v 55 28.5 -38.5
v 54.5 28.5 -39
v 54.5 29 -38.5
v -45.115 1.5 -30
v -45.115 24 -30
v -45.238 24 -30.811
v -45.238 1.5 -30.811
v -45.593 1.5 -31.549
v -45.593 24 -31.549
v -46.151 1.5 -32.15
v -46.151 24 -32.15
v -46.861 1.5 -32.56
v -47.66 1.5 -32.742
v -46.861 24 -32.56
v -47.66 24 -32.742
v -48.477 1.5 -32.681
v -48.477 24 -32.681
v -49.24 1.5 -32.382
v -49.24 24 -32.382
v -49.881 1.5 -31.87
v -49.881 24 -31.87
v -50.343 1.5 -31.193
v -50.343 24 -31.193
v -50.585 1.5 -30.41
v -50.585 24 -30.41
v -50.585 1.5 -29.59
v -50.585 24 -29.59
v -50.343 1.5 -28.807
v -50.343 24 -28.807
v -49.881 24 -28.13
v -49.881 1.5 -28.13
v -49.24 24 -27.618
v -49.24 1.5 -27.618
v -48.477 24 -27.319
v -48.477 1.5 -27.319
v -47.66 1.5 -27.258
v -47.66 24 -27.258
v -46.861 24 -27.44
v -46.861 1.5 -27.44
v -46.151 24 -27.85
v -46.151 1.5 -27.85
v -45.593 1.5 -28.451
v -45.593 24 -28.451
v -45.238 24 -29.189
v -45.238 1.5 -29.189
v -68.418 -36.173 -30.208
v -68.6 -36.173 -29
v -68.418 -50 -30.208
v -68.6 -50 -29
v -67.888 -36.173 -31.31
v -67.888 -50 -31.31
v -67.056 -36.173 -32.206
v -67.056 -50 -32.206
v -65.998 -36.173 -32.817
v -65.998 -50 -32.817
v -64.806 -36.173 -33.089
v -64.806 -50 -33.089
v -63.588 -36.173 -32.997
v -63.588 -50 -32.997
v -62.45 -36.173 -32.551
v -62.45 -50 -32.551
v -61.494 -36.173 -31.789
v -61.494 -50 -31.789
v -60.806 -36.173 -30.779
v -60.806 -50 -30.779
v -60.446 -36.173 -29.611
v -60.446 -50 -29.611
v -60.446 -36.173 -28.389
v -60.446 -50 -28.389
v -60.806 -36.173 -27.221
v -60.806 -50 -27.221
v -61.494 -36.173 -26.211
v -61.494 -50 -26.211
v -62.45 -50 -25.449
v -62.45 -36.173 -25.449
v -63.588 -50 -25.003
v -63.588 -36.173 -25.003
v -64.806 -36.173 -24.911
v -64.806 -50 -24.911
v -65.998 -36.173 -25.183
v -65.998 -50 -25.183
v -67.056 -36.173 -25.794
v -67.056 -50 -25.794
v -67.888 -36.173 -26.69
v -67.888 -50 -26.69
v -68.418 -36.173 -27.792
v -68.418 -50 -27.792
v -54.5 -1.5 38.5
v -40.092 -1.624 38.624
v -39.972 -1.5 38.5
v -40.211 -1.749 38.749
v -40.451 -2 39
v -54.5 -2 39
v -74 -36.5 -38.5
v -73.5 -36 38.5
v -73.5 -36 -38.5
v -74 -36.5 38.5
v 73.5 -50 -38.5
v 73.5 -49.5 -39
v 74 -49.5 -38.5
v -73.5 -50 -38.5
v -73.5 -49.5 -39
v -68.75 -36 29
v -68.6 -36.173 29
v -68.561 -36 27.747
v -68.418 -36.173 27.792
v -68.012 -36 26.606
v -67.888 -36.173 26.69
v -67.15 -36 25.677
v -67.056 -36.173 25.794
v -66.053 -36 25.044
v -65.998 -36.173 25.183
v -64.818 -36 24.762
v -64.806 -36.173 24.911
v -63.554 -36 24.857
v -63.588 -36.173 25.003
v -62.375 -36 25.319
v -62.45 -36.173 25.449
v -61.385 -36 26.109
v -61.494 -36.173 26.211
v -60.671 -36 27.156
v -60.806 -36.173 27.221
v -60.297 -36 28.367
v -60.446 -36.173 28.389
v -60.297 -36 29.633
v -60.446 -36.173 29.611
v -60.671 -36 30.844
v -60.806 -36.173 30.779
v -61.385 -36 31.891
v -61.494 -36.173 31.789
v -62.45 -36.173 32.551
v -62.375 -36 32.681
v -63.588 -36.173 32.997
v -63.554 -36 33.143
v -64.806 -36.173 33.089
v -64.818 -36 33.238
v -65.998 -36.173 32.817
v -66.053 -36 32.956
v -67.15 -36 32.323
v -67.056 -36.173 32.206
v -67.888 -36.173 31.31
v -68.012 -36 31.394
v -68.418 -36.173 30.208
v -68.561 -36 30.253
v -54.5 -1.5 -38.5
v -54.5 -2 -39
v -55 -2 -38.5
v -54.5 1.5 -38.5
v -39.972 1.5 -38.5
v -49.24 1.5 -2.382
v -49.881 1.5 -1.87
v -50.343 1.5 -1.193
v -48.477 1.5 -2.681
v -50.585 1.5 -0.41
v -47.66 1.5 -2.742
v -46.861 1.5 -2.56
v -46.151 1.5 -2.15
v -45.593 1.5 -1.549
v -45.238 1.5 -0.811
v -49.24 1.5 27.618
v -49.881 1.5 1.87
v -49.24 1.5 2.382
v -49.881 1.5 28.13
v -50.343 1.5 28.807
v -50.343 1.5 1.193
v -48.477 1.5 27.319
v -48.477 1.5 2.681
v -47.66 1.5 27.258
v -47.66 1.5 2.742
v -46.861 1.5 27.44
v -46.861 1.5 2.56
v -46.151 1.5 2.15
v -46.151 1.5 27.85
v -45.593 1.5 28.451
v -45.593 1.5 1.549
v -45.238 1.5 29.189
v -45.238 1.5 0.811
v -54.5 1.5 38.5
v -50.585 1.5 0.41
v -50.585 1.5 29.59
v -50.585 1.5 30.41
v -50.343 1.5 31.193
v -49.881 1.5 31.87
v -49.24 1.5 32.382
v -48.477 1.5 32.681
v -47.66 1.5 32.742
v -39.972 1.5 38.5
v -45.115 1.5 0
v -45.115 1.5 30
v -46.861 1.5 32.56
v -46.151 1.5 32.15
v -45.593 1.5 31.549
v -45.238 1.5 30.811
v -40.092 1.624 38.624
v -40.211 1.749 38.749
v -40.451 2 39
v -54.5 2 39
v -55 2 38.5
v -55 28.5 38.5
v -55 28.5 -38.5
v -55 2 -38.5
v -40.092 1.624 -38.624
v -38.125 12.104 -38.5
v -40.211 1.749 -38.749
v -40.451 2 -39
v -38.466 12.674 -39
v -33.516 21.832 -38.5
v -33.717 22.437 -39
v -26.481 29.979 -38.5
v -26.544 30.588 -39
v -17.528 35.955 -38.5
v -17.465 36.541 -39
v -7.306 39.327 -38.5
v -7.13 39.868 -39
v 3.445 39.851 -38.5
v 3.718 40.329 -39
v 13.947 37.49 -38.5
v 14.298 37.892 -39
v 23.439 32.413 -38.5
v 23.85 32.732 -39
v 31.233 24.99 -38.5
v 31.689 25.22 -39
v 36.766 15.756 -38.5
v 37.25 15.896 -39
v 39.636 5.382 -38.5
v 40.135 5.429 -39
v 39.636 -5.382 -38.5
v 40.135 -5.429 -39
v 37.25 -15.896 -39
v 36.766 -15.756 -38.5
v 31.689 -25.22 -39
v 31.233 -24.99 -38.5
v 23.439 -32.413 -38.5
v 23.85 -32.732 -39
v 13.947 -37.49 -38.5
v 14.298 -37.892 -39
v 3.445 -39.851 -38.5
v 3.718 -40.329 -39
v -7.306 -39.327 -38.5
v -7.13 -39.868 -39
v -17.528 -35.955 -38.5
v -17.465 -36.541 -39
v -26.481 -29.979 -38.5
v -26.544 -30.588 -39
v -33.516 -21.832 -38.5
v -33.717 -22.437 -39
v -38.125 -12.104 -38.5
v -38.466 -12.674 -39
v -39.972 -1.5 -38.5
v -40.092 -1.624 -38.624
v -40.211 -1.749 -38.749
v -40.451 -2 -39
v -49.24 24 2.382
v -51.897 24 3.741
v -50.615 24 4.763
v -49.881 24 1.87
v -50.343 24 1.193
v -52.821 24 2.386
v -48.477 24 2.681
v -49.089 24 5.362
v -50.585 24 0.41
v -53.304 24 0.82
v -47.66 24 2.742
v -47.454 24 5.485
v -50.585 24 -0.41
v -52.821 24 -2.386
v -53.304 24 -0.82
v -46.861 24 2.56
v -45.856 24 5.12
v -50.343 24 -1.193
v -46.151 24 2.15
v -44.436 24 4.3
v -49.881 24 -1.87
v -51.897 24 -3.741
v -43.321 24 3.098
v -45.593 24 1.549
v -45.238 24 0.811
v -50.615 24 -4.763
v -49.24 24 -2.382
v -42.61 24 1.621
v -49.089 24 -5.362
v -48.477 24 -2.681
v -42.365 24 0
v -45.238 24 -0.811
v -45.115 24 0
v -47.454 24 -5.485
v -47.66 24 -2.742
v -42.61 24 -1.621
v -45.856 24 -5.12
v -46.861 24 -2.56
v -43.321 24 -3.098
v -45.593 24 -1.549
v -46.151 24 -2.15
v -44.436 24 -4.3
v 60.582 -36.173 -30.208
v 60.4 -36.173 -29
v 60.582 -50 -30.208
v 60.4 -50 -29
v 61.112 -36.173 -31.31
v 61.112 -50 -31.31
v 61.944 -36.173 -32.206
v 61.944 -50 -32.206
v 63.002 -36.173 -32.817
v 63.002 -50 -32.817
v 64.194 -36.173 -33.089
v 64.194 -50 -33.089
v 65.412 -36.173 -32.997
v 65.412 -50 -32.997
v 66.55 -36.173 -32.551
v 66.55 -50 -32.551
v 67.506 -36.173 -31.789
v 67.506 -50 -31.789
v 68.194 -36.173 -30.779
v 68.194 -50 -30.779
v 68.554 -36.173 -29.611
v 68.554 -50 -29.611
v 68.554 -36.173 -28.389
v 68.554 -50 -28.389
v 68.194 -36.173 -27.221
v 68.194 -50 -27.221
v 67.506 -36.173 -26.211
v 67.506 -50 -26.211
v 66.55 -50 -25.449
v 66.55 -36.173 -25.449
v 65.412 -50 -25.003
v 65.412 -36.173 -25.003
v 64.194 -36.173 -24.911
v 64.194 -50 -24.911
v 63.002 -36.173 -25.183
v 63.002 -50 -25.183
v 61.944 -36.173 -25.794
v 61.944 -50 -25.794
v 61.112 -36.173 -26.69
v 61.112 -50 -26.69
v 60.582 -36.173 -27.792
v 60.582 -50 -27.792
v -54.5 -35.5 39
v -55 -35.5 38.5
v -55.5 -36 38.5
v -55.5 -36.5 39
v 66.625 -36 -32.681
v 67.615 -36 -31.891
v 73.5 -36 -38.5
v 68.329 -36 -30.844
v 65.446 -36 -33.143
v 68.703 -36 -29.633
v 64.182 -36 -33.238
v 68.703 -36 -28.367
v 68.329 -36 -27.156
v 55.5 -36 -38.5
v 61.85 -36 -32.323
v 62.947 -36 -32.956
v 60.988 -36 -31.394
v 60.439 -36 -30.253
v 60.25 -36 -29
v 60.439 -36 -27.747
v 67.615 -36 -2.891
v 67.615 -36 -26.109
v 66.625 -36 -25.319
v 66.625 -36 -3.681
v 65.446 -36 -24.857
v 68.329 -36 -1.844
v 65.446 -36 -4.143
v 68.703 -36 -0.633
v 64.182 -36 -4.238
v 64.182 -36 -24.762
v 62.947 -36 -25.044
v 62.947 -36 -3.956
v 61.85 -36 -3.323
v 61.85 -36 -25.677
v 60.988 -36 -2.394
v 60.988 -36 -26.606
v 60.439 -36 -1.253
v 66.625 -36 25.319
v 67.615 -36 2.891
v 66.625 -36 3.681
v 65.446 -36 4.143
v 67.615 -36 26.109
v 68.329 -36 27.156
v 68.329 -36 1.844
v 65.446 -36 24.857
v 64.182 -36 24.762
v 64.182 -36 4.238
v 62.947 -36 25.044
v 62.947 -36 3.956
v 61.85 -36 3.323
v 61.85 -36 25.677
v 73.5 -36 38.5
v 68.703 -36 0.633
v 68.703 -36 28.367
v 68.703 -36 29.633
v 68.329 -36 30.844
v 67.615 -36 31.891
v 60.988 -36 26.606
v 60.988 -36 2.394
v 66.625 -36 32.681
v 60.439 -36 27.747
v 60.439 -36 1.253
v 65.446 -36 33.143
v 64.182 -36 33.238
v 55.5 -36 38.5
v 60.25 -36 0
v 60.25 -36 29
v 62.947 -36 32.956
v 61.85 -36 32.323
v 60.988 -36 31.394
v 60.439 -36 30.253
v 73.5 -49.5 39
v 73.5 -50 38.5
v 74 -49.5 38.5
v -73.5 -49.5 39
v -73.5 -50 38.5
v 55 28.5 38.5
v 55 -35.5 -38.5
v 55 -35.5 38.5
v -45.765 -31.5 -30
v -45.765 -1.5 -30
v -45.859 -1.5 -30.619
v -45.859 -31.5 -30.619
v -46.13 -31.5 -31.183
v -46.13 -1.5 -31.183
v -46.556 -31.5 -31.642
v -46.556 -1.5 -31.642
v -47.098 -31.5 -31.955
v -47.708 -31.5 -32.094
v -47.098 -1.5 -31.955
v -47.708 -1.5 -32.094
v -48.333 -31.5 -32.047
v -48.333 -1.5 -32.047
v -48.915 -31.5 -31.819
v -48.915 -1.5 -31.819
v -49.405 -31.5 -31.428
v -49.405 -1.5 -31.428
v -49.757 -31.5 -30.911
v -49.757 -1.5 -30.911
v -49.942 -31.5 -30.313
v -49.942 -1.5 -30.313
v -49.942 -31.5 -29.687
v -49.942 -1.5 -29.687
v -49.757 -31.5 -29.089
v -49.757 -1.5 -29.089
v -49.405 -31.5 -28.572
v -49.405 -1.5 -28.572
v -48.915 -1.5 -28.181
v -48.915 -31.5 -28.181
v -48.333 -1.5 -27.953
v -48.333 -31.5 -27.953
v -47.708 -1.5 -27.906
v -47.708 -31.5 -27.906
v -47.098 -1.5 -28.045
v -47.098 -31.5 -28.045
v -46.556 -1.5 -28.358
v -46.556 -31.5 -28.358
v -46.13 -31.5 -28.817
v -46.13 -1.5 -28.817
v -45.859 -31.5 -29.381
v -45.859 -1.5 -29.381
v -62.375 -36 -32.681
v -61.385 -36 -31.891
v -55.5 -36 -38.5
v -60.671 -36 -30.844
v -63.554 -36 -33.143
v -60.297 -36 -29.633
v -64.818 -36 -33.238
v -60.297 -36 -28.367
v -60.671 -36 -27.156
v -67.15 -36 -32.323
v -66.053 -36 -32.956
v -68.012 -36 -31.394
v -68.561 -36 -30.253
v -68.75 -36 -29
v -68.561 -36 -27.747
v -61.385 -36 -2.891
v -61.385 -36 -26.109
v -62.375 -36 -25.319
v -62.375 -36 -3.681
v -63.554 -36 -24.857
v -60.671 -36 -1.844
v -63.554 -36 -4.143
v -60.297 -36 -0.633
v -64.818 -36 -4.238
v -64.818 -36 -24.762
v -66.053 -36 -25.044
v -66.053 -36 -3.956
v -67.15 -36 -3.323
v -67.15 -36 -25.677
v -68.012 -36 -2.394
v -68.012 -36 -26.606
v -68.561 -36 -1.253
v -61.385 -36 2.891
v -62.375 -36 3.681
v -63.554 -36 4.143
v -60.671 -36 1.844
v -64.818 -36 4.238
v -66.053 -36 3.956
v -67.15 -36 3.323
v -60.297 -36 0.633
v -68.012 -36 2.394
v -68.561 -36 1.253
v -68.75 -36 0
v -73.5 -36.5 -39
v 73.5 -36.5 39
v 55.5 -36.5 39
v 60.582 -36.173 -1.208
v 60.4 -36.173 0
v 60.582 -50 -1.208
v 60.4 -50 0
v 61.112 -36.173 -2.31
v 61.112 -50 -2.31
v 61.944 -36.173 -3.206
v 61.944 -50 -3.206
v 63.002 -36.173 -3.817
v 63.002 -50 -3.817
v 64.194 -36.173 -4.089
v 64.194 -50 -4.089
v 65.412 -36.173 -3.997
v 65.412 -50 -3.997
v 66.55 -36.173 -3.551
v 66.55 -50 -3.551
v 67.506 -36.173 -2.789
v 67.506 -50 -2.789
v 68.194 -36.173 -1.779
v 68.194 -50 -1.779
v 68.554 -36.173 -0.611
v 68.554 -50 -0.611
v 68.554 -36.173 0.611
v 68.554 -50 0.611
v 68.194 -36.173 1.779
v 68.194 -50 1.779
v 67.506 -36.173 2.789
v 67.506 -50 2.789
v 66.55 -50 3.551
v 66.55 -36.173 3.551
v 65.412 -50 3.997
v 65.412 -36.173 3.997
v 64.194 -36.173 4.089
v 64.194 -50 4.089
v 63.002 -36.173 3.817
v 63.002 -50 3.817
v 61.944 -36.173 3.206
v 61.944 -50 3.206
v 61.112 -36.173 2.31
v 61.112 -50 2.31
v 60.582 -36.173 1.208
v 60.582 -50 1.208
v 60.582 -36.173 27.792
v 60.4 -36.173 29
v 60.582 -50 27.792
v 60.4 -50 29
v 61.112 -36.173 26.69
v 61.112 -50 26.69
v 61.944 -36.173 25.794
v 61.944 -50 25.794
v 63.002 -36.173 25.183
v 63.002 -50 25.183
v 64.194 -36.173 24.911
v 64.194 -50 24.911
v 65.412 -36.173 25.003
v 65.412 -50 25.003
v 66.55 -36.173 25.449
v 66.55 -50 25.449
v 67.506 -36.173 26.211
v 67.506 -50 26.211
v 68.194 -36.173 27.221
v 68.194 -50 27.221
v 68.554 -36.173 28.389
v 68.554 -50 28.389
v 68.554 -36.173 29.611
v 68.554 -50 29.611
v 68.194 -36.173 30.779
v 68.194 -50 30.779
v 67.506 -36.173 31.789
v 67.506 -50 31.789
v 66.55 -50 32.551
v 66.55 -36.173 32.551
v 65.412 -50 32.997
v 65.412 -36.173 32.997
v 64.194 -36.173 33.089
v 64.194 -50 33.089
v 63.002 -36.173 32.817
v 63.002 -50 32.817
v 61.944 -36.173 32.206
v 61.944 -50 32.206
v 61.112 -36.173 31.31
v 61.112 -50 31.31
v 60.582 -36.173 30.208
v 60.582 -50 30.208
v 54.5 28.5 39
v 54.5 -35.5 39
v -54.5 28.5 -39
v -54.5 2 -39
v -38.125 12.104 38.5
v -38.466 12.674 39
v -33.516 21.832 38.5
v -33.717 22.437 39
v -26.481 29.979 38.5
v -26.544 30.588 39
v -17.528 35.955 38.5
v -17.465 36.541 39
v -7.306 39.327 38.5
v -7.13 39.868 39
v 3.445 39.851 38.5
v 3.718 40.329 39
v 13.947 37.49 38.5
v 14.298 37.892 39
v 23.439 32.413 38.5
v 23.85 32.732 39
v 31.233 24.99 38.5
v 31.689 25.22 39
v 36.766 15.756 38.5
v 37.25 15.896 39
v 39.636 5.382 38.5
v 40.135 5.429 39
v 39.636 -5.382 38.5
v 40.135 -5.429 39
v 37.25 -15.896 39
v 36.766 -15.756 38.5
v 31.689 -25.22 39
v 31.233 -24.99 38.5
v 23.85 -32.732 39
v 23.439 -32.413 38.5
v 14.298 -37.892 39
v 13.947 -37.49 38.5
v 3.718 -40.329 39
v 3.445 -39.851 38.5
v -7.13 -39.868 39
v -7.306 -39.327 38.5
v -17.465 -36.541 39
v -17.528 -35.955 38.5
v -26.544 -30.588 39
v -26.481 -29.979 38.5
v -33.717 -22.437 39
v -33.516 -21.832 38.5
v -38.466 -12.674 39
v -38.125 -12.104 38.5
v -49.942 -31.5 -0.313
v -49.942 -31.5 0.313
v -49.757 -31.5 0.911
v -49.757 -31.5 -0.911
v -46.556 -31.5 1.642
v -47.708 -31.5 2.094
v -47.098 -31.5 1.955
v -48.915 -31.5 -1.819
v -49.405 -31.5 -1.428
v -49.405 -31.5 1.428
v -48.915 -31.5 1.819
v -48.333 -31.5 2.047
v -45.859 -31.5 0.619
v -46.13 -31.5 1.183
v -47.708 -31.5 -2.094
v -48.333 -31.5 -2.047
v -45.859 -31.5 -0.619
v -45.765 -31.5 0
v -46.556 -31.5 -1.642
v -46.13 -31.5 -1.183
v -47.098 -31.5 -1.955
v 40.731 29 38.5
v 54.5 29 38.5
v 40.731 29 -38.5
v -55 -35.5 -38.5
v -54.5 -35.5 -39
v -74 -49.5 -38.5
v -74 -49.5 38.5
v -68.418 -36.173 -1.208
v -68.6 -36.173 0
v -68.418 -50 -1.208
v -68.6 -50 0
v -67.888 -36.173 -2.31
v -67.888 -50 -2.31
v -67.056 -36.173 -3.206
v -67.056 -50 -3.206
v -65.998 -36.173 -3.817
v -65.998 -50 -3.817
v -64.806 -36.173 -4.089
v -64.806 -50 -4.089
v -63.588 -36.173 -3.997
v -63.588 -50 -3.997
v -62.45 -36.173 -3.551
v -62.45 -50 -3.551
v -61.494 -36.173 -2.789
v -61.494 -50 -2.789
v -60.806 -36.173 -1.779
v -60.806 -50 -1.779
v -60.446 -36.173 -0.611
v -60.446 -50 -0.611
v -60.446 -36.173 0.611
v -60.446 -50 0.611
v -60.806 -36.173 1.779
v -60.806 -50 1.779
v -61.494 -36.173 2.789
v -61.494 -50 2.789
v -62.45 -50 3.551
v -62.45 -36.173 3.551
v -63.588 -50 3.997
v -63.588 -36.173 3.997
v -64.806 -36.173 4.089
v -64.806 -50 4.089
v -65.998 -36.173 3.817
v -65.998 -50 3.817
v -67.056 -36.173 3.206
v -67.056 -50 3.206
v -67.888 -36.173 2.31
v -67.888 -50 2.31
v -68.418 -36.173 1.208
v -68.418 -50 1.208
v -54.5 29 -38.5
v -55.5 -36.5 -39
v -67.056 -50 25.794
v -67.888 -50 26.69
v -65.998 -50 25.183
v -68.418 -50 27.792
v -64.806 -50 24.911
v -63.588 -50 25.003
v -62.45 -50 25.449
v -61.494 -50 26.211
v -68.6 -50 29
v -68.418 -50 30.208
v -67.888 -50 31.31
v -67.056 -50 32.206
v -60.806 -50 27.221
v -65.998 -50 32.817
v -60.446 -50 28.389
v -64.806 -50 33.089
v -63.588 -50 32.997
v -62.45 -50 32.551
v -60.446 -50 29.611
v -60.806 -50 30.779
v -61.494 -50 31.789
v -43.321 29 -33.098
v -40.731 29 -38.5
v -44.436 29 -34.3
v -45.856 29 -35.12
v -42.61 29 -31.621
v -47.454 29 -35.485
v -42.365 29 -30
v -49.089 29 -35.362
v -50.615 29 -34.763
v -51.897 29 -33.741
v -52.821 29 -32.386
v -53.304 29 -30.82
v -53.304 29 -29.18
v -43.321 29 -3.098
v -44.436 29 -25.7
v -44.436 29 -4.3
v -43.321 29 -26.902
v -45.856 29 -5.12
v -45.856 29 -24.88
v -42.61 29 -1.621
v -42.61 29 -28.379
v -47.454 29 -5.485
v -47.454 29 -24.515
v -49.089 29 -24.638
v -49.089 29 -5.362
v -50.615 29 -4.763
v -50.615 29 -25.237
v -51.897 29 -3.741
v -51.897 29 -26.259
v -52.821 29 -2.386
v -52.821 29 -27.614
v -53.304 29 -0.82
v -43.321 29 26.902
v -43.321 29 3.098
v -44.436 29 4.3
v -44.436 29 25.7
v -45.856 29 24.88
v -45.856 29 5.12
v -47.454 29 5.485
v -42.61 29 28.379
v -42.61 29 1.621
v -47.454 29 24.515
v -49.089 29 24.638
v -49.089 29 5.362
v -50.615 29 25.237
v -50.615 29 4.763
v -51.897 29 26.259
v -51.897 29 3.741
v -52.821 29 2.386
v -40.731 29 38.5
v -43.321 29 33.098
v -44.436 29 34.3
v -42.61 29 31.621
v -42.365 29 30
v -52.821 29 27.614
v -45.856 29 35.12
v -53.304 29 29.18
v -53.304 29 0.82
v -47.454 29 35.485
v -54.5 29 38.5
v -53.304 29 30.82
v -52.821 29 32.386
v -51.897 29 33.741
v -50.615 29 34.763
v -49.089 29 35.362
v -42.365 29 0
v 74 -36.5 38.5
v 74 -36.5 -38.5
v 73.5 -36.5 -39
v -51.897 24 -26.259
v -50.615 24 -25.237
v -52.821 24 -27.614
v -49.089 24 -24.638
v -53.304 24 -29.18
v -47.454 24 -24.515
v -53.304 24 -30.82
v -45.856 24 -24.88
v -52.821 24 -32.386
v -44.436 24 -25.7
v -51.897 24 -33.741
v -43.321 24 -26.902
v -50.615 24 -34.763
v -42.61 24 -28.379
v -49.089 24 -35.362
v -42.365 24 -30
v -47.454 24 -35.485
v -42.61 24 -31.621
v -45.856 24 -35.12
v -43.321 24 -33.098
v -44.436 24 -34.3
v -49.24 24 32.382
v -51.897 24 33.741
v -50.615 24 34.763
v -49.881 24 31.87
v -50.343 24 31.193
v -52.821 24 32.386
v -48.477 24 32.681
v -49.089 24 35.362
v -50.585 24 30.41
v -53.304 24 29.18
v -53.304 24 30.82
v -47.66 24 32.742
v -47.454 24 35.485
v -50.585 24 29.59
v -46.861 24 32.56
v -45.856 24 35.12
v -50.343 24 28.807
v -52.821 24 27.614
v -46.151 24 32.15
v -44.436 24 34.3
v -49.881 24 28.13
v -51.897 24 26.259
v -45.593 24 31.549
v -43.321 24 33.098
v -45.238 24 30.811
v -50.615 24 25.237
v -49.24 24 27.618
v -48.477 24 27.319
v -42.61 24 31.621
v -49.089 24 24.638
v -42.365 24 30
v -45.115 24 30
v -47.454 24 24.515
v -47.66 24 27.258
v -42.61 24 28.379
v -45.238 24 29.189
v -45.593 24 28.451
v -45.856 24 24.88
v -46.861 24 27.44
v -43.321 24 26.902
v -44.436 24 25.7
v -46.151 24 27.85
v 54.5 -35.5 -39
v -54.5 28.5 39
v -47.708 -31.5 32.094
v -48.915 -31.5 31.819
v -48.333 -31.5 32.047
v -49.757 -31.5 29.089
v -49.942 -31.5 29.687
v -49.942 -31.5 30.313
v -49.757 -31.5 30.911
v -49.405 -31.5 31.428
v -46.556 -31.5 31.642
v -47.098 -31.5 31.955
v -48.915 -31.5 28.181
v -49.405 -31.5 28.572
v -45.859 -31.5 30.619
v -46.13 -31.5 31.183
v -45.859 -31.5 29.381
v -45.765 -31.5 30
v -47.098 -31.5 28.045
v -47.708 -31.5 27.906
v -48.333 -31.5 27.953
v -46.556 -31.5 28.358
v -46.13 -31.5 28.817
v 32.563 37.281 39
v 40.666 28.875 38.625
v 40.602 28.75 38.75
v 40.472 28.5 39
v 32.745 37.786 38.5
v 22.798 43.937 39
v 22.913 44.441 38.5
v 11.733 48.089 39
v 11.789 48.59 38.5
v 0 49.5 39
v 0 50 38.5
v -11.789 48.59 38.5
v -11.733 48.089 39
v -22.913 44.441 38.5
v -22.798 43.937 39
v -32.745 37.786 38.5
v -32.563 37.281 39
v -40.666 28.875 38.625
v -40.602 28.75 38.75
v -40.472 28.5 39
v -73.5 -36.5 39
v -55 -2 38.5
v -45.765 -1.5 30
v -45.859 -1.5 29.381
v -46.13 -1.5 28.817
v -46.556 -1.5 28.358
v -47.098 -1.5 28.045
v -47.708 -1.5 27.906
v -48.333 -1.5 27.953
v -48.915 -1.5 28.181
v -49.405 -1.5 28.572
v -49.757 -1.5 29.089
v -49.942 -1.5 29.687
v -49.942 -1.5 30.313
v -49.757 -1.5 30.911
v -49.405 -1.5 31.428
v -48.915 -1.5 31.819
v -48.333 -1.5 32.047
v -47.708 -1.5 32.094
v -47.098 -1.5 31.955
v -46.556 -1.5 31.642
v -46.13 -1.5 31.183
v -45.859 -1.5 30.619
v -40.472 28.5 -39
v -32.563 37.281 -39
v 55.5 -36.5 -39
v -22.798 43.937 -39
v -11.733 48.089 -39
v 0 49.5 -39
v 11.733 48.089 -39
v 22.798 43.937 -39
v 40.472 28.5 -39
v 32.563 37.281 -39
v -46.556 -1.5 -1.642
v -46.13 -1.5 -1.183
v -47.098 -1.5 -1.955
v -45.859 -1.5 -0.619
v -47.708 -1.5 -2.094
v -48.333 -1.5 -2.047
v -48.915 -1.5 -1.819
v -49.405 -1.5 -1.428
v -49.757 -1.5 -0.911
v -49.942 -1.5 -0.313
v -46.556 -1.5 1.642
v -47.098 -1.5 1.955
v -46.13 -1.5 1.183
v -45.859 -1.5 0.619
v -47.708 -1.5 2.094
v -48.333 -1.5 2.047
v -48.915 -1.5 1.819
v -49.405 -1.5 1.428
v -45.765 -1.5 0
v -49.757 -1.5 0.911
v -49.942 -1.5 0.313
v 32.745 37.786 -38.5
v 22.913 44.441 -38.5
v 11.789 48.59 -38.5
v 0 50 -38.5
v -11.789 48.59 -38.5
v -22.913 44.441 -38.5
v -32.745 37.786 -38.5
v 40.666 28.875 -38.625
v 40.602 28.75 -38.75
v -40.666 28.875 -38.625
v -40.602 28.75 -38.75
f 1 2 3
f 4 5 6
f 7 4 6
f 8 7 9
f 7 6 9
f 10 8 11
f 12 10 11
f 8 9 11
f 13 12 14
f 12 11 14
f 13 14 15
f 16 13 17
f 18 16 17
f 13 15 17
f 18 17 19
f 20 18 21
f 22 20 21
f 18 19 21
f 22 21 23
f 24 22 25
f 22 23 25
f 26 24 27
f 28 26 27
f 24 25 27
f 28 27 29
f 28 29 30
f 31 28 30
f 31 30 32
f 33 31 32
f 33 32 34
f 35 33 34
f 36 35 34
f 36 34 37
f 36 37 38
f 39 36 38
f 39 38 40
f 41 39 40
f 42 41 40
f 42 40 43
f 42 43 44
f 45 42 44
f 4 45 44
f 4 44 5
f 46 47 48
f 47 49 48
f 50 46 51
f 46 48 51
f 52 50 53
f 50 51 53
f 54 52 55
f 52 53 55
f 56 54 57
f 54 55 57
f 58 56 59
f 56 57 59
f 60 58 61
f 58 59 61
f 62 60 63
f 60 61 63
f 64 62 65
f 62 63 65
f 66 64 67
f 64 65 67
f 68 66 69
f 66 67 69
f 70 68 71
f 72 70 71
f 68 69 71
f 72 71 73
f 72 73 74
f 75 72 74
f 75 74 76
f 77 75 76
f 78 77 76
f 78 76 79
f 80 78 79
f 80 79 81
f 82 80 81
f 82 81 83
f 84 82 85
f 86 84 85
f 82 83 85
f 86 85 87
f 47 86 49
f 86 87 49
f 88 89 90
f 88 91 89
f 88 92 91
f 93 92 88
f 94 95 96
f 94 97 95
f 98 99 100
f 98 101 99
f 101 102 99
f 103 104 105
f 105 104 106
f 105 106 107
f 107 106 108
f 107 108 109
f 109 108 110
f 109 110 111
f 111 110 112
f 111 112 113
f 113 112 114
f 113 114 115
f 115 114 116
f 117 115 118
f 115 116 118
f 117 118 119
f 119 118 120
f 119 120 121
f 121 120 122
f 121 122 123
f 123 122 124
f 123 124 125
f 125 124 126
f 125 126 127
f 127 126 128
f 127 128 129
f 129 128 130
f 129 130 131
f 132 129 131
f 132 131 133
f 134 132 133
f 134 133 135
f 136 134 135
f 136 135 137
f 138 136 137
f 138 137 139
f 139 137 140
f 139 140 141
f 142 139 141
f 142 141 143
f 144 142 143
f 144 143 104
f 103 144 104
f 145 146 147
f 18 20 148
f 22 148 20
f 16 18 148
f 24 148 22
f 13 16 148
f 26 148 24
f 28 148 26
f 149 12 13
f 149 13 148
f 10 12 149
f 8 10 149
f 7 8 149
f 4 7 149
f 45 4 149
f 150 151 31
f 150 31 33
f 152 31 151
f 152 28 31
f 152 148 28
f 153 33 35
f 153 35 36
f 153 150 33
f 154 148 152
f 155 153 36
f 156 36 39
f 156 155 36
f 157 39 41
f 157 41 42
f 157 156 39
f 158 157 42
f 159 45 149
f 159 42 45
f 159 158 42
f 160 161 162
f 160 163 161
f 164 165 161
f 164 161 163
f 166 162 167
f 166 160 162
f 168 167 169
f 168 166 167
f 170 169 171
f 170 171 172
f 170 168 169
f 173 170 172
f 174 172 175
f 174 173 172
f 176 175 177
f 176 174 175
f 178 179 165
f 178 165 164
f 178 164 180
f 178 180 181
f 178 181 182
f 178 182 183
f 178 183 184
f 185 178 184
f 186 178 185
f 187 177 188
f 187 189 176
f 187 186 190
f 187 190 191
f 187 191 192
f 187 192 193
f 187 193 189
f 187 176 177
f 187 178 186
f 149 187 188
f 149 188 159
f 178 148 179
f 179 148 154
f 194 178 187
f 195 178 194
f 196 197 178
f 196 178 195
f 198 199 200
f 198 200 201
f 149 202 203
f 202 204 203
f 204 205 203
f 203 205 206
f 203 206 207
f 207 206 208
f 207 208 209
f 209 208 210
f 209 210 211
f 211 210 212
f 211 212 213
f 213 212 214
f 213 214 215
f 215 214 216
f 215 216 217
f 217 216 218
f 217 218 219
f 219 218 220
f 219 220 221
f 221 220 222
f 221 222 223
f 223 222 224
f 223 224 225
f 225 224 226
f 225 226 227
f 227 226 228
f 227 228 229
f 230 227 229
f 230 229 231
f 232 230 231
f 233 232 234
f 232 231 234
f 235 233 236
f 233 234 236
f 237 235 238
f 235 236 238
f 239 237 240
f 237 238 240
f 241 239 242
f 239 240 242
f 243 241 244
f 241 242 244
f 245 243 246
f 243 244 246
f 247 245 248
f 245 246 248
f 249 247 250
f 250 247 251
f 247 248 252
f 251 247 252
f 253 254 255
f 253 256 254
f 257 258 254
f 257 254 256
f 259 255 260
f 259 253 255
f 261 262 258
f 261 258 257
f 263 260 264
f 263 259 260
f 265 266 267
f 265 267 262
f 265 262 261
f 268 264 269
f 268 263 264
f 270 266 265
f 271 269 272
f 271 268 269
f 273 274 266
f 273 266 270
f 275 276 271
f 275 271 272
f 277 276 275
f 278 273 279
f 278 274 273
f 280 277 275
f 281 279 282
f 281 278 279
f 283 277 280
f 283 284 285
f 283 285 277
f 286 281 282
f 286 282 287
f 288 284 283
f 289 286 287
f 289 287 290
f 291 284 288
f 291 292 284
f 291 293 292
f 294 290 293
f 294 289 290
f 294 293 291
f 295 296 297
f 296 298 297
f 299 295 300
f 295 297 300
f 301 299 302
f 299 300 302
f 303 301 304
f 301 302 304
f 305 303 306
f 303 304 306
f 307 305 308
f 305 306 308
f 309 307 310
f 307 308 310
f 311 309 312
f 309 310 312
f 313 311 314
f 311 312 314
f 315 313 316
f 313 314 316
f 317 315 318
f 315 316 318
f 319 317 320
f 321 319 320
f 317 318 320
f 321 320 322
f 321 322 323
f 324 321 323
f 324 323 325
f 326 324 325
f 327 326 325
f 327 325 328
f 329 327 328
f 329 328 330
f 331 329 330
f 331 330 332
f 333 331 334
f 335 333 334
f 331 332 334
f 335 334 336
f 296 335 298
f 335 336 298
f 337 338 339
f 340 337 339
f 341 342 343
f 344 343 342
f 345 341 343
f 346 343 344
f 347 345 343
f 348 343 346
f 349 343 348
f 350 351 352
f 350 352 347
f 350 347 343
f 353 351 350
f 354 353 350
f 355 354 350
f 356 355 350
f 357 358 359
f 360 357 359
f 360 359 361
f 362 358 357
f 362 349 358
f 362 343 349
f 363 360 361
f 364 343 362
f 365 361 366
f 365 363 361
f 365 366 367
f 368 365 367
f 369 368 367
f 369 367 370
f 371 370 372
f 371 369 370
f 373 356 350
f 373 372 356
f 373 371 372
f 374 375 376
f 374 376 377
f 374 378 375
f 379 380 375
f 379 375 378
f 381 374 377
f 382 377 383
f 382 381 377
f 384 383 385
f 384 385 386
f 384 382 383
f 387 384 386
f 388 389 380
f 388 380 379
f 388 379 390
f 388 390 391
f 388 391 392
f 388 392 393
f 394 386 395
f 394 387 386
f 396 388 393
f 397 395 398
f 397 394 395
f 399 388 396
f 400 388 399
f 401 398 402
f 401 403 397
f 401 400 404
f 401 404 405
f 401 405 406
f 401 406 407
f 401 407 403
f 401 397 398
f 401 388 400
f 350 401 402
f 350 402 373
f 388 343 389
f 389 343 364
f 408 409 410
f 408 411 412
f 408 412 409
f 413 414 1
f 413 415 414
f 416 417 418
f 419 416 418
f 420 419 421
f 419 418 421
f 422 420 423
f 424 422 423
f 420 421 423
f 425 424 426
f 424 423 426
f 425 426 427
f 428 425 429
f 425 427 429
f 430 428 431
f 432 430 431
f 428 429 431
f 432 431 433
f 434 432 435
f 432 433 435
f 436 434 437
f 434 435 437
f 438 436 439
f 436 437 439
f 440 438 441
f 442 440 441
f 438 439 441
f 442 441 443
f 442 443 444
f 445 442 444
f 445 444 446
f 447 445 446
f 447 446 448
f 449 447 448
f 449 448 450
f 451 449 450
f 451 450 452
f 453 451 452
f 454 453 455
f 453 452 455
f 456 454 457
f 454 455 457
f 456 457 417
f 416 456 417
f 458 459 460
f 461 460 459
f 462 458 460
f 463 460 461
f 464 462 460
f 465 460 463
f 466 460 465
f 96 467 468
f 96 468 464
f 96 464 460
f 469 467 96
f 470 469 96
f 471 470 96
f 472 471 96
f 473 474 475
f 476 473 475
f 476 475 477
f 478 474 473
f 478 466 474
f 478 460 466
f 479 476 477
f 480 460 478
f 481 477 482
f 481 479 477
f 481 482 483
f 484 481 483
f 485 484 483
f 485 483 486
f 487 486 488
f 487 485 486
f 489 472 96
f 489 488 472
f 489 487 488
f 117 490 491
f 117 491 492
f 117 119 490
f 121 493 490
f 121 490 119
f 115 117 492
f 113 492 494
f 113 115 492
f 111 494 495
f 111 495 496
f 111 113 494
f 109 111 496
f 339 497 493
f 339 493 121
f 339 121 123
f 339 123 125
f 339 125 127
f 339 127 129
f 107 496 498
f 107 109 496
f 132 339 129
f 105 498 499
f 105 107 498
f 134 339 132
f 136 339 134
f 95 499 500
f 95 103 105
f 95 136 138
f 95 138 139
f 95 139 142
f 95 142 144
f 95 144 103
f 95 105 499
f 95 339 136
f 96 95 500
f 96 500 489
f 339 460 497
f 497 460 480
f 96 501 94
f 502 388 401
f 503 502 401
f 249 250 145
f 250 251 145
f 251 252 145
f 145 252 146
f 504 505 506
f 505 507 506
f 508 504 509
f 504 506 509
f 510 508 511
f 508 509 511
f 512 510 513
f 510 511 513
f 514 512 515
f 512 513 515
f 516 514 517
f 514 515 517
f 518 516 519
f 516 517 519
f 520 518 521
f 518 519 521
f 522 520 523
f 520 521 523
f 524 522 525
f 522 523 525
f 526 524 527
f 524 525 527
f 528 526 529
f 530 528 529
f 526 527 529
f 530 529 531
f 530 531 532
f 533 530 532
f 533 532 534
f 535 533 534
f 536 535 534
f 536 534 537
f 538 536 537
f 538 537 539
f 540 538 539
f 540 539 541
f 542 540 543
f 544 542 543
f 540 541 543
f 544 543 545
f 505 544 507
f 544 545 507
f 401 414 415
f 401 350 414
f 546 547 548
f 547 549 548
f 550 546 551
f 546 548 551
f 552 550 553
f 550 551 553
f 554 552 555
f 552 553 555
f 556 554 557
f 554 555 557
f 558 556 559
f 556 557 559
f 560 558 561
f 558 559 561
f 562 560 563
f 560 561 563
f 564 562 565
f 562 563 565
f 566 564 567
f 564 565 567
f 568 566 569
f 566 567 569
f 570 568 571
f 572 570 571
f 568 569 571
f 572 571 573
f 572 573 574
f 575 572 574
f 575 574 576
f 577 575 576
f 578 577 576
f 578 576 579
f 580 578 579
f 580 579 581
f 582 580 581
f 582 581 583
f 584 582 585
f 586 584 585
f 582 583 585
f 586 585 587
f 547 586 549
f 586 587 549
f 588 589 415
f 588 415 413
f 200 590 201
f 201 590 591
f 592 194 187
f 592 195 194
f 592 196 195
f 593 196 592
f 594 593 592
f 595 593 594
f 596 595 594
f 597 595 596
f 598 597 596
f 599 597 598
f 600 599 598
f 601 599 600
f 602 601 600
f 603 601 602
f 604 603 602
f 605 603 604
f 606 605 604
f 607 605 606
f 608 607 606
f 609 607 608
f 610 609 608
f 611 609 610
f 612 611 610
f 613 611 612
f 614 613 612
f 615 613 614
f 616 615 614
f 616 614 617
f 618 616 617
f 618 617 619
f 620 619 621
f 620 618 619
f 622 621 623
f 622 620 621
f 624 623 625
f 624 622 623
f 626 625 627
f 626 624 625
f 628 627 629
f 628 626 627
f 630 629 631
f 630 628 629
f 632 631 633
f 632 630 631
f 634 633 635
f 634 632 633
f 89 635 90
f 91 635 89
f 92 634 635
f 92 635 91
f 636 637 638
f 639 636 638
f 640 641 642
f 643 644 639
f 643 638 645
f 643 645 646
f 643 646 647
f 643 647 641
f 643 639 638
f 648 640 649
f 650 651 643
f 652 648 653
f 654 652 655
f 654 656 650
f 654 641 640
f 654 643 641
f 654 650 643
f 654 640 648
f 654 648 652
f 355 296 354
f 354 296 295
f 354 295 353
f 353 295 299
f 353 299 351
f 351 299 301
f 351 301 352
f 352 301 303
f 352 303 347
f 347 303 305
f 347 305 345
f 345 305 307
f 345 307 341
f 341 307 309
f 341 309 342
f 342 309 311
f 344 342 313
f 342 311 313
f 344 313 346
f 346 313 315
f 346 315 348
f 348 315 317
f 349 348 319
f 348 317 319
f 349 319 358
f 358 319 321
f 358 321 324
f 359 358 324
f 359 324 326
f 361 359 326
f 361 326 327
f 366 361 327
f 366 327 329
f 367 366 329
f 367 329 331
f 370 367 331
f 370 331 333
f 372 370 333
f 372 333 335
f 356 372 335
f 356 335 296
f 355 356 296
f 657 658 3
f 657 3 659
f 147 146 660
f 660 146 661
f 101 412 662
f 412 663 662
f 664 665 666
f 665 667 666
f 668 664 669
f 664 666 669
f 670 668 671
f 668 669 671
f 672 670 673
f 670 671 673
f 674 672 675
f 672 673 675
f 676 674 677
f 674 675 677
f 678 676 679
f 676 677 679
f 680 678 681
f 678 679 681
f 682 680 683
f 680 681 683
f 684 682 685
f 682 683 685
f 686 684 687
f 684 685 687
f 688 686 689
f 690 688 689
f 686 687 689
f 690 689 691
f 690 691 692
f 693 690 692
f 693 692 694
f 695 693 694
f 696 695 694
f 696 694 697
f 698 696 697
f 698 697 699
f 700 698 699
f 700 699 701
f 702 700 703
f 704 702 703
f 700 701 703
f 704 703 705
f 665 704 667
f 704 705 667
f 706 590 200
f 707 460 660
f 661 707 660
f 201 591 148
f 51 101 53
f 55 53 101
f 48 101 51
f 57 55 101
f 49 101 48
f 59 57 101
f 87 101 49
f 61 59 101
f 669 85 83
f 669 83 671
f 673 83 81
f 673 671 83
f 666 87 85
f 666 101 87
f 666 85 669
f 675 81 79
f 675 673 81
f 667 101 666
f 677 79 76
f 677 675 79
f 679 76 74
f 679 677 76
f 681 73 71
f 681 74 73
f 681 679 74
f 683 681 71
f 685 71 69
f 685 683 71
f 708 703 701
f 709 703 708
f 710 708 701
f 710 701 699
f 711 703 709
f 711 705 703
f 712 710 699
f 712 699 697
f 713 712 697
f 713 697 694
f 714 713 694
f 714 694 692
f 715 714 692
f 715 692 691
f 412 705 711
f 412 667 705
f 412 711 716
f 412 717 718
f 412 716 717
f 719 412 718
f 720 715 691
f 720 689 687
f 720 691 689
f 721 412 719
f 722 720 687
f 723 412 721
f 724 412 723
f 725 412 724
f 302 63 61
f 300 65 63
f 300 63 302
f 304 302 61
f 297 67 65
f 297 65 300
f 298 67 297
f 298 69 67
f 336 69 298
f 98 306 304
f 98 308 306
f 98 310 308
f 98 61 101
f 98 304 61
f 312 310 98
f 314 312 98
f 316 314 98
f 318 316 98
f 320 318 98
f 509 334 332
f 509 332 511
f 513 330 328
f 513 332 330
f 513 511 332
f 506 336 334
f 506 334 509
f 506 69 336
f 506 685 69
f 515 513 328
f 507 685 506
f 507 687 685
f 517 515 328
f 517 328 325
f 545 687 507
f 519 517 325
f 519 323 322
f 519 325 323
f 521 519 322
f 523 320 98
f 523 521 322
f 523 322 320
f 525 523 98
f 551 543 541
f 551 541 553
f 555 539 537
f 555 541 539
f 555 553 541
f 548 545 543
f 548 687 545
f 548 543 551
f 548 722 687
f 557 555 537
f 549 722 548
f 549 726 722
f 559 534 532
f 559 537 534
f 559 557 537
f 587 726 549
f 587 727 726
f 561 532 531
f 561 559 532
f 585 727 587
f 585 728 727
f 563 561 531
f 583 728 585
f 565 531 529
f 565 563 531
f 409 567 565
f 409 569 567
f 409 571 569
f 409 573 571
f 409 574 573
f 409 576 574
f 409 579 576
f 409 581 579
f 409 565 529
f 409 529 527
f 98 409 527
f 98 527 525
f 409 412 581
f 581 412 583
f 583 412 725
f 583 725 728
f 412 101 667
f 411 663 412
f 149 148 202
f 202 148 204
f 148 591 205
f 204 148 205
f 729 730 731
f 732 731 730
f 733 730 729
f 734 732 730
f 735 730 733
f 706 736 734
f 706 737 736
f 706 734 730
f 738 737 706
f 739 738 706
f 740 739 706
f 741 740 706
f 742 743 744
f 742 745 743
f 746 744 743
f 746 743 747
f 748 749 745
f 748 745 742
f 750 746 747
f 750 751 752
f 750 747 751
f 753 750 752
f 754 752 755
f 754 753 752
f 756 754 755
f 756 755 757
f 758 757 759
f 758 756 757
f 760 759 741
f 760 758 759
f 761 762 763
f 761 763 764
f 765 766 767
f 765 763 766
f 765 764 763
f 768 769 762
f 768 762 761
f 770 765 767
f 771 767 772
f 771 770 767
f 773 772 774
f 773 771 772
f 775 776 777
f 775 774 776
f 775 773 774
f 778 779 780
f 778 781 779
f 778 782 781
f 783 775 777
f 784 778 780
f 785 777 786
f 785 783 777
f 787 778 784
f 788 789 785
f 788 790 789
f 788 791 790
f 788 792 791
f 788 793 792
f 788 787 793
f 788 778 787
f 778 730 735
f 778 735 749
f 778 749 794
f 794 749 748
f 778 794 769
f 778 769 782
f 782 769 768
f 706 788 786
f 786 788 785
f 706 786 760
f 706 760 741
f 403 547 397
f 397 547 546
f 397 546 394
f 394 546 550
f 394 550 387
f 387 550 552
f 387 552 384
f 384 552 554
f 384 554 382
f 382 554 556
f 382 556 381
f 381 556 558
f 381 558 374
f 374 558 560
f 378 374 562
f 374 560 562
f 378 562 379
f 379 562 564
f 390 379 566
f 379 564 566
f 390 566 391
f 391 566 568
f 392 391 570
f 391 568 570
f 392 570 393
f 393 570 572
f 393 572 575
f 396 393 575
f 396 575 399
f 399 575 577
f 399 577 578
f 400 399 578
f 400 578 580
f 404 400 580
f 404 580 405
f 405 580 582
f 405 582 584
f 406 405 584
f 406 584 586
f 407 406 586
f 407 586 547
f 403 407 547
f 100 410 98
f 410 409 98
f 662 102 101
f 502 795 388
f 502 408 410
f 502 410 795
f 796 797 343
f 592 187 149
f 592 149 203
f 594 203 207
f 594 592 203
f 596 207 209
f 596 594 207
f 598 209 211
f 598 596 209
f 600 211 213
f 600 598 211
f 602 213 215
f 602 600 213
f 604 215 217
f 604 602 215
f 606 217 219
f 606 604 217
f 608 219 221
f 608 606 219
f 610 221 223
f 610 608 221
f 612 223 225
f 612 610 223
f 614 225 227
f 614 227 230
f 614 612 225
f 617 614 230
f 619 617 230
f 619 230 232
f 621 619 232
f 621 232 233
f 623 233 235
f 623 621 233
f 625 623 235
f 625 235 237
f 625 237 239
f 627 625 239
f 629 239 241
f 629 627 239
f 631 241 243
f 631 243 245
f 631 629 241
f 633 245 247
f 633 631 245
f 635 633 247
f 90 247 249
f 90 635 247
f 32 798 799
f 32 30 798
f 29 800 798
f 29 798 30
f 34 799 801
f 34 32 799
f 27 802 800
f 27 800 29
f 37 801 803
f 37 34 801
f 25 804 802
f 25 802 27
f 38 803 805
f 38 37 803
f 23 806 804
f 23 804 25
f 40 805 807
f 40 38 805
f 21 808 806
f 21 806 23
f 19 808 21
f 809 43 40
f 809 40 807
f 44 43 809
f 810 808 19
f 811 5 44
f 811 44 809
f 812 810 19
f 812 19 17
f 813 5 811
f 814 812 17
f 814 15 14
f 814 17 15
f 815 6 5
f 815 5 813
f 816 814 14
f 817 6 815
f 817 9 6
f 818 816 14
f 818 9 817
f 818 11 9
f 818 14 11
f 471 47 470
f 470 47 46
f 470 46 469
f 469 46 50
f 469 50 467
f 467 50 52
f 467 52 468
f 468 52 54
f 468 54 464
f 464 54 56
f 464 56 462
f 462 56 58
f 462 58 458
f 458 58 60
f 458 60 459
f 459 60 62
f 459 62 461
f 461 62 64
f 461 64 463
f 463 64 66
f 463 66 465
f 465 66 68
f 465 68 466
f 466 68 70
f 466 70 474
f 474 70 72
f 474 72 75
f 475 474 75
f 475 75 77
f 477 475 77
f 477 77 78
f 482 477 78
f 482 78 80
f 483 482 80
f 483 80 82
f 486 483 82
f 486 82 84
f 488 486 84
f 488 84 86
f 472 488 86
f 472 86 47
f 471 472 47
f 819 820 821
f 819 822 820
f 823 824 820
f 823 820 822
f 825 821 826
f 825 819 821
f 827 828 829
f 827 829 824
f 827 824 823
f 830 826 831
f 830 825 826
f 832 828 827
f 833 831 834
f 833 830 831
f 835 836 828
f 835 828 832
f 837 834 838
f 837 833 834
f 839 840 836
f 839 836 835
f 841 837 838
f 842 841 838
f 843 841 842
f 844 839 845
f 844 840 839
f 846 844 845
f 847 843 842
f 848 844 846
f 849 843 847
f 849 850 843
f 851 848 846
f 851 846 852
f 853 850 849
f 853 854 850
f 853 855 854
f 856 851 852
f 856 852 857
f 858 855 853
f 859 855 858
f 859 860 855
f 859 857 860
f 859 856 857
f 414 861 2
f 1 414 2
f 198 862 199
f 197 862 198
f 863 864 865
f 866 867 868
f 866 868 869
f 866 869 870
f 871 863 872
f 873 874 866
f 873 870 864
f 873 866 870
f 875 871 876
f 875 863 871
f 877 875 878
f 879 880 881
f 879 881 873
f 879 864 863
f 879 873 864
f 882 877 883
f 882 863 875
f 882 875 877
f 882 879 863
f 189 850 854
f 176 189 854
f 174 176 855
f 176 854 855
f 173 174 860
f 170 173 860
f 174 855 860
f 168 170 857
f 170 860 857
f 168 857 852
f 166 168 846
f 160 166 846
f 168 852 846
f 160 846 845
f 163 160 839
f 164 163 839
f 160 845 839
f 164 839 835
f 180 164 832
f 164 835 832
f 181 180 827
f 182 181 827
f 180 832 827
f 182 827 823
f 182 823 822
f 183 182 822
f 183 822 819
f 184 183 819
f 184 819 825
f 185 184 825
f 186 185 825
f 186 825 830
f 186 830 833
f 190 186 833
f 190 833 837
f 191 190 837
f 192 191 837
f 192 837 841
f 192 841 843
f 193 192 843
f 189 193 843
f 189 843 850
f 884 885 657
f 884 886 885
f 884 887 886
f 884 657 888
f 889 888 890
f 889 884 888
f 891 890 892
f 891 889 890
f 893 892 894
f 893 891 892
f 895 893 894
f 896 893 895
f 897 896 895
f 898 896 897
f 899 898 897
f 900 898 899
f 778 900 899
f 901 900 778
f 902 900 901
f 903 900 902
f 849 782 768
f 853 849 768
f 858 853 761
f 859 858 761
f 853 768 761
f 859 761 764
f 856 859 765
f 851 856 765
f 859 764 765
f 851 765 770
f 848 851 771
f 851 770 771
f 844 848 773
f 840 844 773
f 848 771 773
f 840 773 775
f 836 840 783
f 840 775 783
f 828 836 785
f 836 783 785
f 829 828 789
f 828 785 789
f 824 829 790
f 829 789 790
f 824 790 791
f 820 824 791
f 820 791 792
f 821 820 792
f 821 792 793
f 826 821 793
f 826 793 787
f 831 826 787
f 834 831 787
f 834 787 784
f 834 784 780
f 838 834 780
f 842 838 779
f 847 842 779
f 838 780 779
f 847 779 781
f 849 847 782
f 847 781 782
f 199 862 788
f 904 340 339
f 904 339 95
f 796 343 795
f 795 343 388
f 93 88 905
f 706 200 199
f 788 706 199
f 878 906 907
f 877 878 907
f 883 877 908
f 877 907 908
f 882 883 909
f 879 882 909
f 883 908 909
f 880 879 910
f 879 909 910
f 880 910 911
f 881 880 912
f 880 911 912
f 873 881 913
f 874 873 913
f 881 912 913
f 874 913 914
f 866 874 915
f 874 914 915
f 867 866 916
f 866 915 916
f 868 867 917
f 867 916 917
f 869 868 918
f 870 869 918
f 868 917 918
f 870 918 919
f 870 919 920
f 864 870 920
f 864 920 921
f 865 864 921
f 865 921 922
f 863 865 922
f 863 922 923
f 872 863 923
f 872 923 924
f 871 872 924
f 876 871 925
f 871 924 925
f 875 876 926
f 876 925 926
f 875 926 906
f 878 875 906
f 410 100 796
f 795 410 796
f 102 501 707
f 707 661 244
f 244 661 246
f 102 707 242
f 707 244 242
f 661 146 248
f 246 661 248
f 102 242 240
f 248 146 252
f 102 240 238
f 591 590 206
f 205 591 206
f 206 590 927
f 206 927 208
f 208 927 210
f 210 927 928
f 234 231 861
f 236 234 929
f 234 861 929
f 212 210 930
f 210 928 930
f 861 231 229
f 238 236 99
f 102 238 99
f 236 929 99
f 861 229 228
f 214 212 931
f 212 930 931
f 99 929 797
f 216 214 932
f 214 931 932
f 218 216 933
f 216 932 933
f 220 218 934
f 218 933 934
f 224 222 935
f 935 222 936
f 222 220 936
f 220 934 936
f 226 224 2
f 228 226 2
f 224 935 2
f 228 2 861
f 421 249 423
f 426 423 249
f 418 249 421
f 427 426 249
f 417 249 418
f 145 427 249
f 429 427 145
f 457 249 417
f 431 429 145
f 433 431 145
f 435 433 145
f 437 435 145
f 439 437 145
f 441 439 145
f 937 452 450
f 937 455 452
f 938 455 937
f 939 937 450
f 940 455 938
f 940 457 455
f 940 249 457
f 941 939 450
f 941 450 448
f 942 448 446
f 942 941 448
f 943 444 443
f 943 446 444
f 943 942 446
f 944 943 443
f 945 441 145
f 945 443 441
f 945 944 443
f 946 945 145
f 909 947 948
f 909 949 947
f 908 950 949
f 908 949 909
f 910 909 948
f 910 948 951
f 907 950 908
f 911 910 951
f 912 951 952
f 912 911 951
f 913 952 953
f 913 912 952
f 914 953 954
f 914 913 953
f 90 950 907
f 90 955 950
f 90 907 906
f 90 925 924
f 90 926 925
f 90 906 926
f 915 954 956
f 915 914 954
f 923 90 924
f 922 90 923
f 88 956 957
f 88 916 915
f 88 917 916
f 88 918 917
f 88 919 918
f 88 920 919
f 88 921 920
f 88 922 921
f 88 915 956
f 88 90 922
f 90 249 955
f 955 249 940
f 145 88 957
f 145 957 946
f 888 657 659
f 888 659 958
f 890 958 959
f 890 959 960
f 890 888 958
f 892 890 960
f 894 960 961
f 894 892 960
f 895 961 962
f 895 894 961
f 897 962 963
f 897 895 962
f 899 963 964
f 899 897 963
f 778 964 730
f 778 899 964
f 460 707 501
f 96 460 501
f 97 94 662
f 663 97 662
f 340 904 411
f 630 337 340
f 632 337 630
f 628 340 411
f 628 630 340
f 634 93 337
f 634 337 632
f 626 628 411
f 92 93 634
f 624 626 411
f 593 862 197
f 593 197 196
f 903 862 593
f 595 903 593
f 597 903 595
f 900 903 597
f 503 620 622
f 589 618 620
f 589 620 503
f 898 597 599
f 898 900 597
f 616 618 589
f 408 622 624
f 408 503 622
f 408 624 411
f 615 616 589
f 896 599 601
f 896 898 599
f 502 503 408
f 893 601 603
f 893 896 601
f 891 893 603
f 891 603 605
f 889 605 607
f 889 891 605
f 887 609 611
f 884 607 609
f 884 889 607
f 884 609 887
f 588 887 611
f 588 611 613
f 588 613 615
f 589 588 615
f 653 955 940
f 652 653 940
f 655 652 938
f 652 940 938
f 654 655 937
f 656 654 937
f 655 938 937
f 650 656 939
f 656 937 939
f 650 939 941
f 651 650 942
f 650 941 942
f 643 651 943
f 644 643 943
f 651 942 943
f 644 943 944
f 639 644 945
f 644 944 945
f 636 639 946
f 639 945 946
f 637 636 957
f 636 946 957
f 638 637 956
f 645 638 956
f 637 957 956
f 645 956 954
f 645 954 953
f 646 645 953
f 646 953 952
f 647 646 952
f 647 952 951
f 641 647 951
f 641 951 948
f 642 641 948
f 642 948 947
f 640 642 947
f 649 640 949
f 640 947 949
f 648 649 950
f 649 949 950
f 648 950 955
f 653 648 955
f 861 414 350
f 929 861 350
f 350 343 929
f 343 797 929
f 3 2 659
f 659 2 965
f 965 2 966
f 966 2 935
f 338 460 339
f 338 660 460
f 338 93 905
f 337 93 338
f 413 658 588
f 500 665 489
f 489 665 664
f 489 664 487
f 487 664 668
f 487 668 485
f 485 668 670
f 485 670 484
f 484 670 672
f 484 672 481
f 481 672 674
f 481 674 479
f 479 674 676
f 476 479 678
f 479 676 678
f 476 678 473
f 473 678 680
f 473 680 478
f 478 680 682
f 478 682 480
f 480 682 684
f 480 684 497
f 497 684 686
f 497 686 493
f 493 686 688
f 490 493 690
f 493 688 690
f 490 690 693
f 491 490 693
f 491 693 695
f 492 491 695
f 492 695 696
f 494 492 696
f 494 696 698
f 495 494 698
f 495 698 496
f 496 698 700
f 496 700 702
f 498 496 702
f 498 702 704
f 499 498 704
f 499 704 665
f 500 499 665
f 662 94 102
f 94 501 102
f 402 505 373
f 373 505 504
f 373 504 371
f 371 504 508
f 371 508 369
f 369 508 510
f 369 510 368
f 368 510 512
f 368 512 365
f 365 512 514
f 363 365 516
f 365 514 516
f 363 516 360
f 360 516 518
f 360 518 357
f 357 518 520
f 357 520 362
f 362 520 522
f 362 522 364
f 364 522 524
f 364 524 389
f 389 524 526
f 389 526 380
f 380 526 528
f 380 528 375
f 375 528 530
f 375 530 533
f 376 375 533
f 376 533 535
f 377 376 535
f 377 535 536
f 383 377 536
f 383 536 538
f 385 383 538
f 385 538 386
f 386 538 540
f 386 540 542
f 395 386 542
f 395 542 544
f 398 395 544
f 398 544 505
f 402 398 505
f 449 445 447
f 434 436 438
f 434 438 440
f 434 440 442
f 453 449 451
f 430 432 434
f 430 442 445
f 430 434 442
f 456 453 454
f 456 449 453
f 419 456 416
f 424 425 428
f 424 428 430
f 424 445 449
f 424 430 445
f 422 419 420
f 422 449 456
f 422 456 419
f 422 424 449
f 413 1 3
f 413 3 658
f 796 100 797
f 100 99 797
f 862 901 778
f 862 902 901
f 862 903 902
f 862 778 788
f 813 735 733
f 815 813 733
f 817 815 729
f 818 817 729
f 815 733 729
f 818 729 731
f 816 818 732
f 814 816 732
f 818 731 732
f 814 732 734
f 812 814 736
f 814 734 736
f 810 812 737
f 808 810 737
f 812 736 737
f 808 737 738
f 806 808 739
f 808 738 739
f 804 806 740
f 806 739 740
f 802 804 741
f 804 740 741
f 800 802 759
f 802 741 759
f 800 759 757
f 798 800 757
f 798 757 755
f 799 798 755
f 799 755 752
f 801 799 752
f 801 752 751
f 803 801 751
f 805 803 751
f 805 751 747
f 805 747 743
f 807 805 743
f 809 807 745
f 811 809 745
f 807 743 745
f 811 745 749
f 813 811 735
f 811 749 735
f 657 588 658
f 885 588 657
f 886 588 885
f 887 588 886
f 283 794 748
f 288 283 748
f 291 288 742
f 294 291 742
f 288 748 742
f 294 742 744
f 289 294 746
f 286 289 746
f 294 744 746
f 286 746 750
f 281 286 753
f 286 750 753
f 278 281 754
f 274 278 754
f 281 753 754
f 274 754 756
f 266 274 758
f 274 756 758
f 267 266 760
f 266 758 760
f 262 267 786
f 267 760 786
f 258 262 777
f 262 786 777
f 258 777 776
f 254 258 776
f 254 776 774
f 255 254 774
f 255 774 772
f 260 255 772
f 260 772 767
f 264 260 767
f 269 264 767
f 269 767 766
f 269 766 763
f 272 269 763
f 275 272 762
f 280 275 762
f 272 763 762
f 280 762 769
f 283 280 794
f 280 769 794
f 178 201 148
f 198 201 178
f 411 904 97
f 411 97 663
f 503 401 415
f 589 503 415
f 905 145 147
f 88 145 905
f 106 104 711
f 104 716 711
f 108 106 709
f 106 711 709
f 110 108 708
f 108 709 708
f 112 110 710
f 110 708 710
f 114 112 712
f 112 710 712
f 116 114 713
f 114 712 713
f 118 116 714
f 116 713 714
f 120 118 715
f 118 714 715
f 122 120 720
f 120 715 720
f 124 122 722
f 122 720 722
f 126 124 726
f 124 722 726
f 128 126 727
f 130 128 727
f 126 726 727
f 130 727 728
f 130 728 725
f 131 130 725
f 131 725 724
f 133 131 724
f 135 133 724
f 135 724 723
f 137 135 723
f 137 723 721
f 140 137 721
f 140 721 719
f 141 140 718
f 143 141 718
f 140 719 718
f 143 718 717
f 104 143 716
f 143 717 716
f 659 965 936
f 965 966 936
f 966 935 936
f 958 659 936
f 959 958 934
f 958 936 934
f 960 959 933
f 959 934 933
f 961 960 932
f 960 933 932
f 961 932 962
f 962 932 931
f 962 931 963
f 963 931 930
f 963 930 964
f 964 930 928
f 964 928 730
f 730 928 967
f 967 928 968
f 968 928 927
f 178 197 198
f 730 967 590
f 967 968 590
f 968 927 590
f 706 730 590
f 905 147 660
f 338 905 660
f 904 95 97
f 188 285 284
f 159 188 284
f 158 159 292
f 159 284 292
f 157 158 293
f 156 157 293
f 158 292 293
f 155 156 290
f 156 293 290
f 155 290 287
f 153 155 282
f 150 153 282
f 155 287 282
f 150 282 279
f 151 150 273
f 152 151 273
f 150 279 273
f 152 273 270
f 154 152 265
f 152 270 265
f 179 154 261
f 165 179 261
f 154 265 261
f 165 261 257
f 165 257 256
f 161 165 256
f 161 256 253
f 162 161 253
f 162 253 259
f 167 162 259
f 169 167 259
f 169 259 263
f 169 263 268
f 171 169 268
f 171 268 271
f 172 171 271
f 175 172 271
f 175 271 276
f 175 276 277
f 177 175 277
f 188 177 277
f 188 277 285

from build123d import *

# Parameters (mm, degrees)
EXTRUDE_1_DEPTH      = 39
SKETCH_2_R           = 5.5
CUT_EXTRUDE_1_DEPTH  = 5
SKETCH_3_R           = 2.75
CUT_EXTRUDE_2_DEPTH  = 25.5
SKETCH_4_R           = 2.1
CUT_EXTRUDE_3_DEPTH  = 30
HOLEWZD1_D           = 8.2
HOLEWZD1_DEPTH       = 16
HOLEWZD1_CSINK_D     = 8.5
HOLEWZD1_CSINK_ANGLE = 82
CHAMFER1_SIZE        = 0.5


with BuildPart() as part:
    # Эскиз1 → Бобышка-Вытянуть1 (new body, symmetric)
    with BuildSketch(Plane.XY):
        with BuildLine():
            Line((74, -50), (74, -36))
            Line((74, -36), (55, -36))
            Line((55, -36), (55, 29))
            Line((55, 29), (40.730823709, 29))
            ThreePointArc((40.730823709, 29), (0, 50), (-40.730823709, 29))
            Line((-40.730823709, 29), (-55, 29))
            Line((-55, 29), (-55, 1.5))
            Line((-55, 1.5), (-39.971865105, 1.5))
            ThreePointArc((-39.971865105, 1.5), (40, 0), (-39.971865105, -1.5))
            Line((-39.971865105, -1.5), (-55, -1.5))
            Line((-55, -1.5), (-55, -36))
            Line((-55, -36), (-74, -36))
            Line((-74, -36), (-74, -50))
            Line((-74, -50), (74, -50))
        make_face()
    extrude(amount=EXTRUDE_1_DEPTH, both=True)

    # Эскиз2 → Вырез-Вытянуть1 (cut)
    with BuildSketch(Plane(origin=(0, 29, 0), x_dir=(1, 0, 0), z_dir=(0, 1, 0))):
        with Locations((-47.865411854, 30)):
            Circle(SKETCH_2_R)
        with Locations((-47.865411854, 0)):
            Circle(SKETCH_2_R)
        with Locations((-47.865411854, -30)):
            Circle(SKETCH_2_R)
    extrude(amount=-CUT_EXTRUDE_1_DEPTH, mode=Mode.SUBTRACT)

    # Эскиз3 → Вырез-Вытянуть2 (cut)
    with BuildSketch(Plane(origin=(0, 24, 0), x_dir=(1, 0, 0), z_dir=(0, 1, 0))):
        with Locations((-47.865411854, 30)):
            Circle(SKETCH_3_R)
        with Locations((-47.865411854, 0)):
            Circle(SKETCH_3_R)
        with Locations((-47.865411854, -30)):
            Circle(SKETCH_3_R)
    extrude(amount=-CUT_EXTRUDE_2_DEPTH, mode=Mode.SUBTRACT)

    # Эскиз4 → Вырез-Вытянуть3 (cut)
    with BuildSketch(Plane(origin=(0, -1.5, 0), x_dir=(1, 0, 0), z_dir=(0, 1, 0))):
        with Locations((-47.865411854, 30)):
            Circle(SKETCH_4_R)
        with Locations((-47.865411854, 0)):
            Circle(SKETCH_4_R)
        with Locations((-47.865411854, -30)):
            Circle(SKETCH_4_R)
    extrude(amount=-CUT_EXTRUDE_3_DEPTH, mode=Mode.SUBTRACT)

    # HoleWzd1
    with Locations(Plane(origin=(0, -36, 0), x_dir=(1, 0, 0), z_dir=(0, 1, 0))):
        with Locations((-64.5, 29), (-64.5, 0), (-64.5, -29), (64.5, -29), (64.5, 0), (64.5, 29)):
            CounterSinkHole(HOLEWZD1_D / 2, HOLEWZD1_CSINK_D / 2, depth=HOLEWZD1_DEPTH, counter_sink_angle=HOLEWZD1_CSINK_ANGLE)

    # Chamfer1
    chamfer1_edges = [part.edges().sort_by_distance(p)[0] for p in [
        (-47.865411854, 29, 39),
        (55, -3.5, -39),
        (64.5, -36, -39),
        (74, -43, -39),
        (0, -50, -39),
        (-55, 15.25, 39),
        (-74, -43, -39),
        (-64.5, -36, -39),
        (-55, -18.75, -39),
        (-47.485932553, -1.5, -39),
        (40, 0, -39),
        (-47.485932553, 1.5, -39),
        (-55, 15.25, -39),
        (-47.485932553, 1.5, 39),
        (-47.865411854, 29, -39),
        (0, 50, -39),
        (47.865411854, 29, -39),
        (40, 0, 39),
        (55, 29, 0),
        (55, -36, 0),
        (74, -36, 0),
        (74, -50, 0),
        (-74, -50, 0),
        (-74, -36, 0),
        (-55, -36, 0),
        (-55, -1.5, 0),
        (-55, 1.5, 0),
        (-55, 29, 0),
        (-47.485932553, -1.5, 39),
        (-55, -18.75, 39),
        (-64.5, -36, 39),
        (47.865411854, 29, 39),
        (-74, -43, 39),
        (0, -50, 39),
        (74, -43, 39),
        (64.5, -36, 39),
        (55, -3.5, 39),
        (0, 50, 39),
    ]]
    chamfer(chamfer1_edges, length=CHAMFER1_SIZE)


solid = part.part
